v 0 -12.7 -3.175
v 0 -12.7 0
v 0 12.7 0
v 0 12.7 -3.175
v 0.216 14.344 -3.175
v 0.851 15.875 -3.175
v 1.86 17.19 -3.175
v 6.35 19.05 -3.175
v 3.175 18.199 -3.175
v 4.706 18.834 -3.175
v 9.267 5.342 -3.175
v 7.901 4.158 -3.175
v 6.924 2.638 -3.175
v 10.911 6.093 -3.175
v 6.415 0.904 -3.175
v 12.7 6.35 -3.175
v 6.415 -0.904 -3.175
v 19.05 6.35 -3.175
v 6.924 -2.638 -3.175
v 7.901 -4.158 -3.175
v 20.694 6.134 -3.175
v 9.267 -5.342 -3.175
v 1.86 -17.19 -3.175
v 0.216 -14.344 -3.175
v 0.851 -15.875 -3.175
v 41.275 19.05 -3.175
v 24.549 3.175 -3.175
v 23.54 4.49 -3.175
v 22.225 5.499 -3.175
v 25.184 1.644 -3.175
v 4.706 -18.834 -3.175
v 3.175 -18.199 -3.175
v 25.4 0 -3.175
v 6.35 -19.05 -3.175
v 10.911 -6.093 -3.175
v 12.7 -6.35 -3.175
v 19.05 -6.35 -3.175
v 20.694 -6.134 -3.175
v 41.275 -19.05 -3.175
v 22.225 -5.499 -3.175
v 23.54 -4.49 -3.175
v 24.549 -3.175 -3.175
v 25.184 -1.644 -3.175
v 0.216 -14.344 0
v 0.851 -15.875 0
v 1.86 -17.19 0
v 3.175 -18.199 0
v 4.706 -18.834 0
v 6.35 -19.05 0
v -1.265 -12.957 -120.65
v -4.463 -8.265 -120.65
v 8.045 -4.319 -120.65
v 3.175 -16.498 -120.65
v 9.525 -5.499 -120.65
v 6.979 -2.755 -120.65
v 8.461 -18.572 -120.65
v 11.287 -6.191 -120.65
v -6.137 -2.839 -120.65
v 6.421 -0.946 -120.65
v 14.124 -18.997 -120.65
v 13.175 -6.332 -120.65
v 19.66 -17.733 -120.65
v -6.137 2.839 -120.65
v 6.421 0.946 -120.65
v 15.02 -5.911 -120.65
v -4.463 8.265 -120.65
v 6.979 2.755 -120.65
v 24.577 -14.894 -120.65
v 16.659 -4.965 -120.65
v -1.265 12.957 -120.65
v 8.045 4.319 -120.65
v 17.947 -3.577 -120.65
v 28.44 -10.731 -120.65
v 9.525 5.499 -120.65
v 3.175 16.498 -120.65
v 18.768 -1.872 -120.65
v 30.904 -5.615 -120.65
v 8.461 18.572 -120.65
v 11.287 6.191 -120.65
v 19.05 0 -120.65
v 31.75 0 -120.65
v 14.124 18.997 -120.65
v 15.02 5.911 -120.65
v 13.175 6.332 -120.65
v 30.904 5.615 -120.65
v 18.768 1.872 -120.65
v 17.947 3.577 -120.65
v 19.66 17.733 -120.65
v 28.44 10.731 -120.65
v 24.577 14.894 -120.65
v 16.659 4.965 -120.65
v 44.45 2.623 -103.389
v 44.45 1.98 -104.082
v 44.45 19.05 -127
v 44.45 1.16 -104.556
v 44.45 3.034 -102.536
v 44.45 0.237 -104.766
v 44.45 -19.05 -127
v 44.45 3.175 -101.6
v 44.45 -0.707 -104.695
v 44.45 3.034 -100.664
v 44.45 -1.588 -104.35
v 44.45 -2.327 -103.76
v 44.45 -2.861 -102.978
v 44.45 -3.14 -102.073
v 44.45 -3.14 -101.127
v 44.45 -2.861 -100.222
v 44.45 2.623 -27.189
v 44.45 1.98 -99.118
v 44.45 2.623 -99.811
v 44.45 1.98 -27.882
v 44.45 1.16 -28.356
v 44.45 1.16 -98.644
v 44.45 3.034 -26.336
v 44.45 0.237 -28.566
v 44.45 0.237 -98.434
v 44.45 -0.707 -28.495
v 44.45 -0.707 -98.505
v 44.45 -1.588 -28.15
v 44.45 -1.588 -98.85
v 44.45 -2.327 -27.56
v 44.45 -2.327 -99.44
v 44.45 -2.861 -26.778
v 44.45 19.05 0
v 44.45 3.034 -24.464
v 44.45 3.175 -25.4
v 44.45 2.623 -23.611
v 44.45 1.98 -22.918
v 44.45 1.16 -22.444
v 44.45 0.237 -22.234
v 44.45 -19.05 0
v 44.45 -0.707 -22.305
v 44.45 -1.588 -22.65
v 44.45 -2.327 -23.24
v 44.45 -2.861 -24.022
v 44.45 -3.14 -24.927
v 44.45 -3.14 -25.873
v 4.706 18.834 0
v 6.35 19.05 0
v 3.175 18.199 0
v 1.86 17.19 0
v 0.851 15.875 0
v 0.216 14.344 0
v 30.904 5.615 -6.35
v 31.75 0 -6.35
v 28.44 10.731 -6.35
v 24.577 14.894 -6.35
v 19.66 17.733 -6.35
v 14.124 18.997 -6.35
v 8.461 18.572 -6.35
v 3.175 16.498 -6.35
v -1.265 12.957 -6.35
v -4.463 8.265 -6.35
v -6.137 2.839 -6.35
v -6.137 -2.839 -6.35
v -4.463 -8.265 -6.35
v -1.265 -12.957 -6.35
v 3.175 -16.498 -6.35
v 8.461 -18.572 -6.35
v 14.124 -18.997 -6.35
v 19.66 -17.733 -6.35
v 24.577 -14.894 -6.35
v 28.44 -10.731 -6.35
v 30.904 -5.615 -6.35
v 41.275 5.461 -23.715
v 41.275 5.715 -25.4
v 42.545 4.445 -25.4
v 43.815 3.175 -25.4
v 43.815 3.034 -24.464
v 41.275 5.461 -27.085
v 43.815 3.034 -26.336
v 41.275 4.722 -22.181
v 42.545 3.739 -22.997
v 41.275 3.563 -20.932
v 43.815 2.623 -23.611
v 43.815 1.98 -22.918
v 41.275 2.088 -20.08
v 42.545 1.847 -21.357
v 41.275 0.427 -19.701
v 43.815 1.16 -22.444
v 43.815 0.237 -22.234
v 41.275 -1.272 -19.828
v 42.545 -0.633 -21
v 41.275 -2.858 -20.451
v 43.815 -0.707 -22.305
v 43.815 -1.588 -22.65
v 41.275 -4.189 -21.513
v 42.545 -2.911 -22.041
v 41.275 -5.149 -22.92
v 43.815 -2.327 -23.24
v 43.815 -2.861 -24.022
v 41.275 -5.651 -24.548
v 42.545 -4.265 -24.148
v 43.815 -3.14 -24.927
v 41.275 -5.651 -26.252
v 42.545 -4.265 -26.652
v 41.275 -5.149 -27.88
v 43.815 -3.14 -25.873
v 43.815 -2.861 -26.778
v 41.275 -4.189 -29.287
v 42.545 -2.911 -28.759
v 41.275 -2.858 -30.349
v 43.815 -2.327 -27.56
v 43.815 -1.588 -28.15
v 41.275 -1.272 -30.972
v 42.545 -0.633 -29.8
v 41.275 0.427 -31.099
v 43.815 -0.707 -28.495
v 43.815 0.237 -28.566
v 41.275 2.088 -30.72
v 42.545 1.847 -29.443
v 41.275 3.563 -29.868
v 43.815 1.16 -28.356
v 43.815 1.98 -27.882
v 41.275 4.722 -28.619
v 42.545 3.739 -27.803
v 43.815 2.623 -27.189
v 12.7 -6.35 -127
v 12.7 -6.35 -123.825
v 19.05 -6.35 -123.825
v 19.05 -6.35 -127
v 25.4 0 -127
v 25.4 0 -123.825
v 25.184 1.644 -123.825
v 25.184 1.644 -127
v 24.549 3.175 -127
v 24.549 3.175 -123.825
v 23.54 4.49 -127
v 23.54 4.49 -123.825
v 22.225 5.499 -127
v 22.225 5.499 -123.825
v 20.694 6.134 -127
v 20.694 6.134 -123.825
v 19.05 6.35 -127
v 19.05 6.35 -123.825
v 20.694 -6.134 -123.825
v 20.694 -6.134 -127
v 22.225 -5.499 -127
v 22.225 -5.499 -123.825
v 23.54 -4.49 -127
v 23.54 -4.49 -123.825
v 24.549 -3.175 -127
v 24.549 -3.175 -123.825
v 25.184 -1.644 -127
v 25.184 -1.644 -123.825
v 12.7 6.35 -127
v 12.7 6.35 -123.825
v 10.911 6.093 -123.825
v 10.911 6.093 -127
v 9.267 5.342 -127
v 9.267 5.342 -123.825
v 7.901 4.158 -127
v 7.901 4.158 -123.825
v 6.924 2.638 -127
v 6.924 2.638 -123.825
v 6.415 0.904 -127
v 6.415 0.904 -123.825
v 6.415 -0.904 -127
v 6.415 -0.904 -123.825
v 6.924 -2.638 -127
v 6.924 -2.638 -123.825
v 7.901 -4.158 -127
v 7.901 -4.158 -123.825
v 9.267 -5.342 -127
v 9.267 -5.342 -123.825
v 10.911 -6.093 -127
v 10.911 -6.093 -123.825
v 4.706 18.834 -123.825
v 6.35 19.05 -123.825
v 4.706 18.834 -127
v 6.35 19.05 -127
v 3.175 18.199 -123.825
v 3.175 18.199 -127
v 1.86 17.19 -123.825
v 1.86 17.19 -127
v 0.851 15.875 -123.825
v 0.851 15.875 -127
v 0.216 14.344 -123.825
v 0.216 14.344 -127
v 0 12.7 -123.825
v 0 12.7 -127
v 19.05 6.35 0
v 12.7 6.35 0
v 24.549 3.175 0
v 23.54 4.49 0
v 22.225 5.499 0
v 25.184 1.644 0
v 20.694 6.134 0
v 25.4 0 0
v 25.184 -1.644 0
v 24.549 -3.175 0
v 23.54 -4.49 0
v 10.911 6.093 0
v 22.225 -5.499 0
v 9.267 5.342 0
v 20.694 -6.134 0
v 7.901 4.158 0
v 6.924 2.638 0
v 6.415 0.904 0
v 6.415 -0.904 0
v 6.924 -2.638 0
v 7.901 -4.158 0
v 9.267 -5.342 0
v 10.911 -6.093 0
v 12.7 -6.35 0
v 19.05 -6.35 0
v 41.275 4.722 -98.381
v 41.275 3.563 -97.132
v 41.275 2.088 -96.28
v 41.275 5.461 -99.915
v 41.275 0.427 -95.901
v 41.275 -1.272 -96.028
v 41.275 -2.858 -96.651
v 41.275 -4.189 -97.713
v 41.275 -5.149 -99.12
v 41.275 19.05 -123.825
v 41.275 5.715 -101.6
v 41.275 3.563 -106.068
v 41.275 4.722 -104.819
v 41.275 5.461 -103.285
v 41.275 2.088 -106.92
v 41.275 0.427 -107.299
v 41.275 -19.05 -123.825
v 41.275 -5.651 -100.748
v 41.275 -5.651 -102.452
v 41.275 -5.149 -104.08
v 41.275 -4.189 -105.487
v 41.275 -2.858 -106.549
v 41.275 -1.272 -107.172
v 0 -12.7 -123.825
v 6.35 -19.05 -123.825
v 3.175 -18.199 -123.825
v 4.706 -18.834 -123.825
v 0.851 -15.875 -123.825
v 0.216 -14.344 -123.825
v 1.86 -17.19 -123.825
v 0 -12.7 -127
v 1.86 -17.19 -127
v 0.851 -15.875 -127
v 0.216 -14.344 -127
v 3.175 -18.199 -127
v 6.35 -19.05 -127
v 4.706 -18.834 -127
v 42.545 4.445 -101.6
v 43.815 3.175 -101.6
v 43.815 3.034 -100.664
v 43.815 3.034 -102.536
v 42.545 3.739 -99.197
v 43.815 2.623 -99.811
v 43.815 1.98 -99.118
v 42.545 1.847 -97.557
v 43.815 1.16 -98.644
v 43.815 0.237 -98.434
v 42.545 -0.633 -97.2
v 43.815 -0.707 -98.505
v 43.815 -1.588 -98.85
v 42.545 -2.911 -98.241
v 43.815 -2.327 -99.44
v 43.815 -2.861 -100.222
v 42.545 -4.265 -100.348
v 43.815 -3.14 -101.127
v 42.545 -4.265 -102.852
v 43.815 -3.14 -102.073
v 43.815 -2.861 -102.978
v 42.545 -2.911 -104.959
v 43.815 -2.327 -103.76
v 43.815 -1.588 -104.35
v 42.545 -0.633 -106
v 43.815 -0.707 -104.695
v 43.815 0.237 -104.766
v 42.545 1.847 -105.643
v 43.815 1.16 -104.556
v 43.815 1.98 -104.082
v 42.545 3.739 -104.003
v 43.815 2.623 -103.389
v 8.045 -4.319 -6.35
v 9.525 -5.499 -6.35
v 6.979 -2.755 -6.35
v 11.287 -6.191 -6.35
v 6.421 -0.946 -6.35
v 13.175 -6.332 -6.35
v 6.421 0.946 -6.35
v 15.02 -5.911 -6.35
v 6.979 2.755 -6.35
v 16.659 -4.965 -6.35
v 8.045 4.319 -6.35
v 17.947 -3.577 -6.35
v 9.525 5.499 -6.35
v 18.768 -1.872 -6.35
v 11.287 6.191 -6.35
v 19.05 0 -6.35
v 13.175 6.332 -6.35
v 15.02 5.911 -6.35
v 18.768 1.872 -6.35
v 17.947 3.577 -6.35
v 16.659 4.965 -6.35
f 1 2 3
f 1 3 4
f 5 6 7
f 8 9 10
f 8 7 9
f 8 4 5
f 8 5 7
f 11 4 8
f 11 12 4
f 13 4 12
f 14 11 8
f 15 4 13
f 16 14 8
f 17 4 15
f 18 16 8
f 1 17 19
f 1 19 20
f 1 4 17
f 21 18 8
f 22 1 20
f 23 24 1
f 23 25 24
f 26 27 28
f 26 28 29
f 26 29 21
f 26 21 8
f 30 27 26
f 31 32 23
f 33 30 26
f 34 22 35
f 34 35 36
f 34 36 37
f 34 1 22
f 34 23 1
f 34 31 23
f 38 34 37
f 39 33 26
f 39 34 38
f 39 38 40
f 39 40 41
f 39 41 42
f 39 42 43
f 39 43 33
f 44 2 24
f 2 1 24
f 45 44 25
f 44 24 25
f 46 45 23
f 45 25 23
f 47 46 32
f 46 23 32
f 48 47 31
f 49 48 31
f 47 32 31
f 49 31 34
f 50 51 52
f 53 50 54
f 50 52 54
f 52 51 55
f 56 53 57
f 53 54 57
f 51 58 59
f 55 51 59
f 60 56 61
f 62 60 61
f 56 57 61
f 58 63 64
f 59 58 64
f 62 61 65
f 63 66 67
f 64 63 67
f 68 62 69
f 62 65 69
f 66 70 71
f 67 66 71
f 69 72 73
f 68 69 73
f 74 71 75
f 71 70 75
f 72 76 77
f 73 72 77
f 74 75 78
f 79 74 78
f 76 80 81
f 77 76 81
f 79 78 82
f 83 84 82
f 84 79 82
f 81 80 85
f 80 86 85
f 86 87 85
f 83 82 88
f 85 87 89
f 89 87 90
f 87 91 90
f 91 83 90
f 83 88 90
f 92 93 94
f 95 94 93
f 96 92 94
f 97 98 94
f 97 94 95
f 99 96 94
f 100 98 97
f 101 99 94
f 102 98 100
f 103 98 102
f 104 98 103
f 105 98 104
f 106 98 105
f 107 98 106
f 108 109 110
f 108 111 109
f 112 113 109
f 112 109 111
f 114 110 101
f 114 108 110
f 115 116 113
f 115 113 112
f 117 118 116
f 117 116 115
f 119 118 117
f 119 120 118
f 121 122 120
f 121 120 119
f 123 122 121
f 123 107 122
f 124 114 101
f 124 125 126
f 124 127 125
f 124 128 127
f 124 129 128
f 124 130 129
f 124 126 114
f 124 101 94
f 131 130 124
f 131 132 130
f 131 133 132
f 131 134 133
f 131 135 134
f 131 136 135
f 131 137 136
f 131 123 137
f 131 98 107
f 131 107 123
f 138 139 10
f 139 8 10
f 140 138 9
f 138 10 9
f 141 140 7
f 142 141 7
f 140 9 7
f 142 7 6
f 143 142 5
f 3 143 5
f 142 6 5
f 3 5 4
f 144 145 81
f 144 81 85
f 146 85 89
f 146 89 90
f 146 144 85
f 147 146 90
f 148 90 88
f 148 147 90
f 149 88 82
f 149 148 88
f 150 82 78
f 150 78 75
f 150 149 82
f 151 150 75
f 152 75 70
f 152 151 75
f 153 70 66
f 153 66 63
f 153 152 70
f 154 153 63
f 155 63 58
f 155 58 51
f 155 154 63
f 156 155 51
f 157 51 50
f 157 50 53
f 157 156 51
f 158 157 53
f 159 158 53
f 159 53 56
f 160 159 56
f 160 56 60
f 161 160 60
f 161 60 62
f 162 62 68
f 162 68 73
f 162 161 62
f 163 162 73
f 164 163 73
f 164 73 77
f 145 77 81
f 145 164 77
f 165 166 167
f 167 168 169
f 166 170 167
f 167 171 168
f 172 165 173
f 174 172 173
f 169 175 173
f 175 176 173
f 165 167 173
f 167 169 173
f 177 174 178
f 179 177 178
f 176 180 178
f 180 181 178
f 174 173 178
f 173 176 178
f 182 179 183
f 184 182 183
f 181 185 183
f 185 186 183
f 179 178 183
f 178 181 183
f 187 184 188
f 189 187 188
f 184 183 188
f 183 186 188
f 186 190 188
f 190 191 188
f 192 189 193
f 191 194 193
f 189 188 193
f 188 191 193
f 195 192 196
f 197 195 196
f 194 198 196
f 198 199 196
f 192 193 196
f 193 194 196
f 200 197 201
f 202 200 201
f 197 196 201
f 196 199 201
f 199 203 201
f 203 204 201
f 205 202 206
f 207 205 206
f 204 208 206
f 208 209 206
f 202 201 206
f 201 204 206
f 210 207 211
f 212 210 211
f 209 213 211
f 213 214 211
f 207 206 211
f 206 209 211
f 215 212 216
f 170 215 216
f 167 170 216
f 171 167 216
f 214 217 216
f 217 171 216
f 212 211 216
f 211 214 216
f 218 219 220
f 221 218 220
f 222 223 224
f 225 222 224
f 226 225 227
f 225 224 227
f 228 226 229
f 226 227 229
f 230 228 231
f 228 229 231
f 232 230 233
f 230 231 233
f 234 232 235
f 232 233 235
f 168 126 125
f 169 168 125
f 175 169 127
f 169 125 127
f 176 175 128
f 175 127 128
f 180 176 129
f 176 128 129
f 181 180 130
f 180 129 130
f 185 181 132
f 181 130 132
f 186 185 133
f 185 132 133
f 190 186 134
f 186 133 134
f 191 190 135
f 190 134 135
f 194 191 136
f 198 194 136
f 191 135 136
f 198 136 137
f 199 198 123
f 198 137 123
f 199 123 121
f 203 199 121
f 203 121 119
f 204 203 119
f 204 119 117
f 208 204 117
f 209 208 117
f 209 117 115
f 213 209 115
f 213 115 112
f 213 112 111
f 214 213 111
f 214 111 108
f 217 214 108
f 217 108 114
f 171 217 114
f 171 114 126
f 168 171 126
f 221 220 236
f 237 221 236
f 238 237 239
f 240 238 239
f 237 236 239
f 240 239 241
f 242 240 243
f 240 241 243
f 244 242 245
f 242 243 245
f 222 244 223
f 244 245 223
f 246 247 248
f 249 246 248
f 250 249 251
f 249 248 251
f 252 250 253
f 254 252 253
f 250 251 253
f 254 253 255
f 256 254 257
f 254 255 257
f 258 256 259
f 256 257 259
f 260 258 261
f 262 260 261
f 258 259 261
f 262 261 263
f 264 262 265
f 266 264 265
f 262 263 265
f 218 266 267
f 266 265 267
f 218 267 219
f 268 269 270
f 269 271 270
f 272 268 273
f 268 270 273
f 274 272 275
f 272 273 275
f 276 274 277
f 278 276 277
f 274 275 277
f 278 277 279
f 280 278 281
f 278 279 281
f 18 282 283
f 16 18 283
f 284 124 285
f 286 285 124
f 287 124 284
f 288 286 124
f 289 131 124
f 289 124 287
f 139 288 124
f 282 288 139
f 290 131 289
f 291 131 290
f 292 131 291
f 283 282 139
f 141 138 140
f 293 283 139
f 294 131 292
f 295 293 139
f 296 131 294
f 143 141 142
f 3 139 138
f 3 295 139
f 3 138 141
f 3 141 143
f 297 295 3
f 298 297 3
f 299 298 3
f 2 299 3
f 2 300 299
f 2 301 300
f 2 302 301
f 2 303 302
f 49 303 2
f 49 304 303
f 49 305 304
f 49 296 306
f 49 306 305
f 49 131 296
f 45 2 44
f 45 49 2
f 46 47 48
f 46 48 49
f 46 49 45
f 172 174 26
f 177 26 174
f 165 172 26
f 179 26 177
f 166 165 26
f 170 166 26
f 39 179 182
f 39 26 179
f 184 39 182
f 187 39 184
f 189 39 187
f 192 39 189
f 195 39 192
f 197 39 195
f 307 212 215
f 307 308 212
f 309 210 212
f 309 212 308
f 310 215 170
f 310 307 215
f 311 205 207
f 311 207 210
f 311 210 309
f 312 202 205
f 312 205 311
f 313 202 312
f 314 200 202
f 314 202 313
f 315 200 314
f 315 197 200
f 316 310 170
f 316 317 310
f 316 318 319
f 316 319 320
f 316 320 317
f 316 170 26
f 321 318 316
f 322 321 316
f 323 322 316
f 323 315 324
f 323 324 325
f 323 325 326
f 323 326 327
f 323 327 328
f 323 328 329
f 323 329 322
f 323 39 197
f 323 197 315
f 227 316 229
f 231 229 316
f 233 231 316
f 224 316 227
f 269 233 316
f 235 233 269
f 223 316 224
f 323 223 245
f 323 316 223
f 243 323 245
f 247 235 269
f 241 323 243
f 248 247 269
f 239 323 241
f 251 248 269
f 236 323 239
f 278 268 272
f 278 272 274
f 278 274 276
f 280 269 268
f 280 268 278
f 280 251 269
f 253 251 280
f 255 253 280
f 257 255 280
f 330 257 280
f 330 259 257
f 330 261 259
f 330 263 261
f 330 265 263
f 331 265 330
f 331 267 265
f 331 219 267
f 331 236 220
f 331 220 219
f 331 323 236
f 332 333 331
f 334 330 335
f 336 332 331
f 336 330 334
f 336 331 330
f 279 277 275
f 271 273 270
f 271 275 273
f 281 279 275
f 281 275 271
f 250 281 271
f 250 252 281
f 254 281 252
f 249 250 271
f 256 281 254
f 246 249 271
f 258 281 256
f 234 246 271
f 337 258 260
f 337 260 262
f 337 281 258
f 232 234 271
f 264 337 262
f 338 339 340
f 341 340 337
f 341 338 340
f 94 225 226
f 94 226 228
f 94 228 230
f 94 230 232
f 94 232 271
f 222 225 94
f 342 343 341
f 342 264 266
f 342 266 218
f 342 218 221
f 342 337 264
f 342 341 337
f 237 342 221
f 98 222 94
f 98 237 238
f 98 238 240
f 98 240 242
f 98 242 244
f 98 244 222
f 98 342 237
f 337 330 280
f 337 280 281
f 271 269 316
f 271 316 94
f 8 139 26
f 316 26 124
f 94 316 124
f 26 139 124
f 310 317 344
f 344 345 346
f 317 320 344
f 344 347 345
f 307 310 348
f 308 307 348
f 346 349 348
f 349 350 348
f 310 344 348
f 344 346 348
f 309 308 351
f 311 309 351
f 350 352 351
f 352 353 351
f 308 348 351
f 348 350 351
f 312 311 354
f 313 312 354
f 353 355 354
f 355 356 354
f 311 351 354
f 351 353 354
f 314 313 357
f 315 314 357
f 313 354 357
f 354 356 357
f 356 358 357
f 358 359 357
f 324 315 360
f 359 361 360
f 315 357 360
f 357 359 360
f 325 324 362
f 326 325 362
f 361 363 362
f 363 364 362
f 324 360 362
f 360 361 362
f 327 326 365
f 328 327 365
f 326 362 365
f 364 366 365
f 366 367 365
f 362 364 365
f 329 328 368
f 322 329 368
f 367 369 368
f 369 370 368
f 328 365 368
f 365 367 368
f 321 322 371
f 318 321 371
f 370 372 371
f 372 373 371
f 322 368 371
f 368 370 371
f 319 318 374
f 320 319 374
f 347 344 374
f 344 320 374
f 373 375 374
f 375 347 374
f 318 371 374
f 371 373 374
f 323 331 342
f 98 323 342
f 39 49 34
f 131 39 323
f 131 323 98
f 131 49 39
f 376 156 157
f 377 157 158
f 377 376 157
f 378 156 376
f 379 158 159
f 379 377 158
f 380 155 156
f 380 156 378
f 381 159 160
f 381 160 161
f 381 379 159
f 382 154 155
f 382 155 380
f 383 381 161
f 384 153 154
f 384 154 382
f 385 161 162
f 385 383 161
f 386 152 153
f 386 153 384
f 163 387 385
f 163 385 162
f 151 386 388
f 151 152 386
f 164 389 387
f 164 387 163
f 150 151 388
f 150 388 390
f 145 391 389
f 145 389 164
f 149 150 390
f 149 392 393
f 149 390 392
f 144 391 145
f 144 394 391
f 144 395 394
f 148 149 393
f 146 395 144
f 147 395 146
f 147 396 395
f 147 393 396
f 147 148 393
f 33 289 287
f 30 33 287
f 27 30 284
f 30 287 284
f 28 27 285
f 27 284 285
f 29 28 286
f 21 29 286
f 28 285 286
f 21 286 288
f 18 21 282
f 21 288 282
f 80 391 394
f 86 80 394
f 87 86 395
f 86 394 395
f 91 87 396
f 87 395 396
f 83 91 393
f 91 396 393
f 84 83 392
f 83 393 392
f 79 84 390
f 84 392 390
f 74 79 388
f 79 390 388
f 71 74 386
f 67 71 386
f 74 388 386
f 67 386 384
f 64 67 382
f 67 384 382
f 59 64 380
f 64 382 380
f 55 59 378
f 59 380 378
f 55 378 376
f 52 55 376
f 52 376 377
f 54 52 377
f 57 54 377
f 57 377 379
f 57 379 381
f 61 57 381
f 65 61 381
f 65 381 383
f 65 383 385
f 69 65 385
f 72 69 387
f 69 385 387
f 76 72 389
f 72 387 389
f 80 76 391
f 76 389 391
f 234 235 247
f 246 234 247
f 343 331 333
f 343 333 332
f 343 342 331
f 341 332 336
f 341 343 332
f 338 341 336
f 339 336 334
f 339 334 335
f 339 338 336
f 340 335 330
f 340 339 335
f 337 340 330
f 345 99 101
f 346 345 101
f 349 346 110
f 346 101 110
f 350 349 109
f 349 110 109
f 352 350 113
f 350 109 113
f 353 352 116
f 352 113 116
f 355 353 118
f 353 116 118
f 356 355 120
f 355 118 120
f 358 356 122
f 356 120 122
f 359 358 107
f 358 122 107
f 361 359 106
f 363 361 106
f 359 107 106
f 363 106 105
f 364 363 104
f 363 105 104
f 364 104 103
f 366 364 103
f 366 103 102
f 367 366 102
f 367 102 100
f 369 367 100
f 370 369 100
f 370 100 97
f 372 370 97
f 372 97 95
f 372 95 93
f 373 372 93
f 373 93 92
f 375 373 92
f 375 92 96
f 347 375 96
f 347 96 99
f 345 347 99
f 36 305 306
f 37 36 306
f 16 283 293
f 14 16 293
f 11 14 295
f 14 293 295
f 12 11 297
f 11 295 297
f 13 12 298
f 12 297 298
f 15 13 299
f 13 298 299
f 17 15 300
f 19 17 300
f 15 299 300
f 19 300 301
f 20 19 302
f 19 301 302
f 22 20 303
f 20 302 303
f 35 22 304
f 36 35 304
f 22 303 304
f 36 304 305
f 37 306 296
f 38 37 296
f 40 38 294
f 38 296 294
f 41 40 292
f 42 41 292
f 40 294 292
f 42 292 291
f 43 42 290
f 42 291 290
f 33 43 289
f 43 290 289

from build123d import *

# Parameters (mm, degrees)
F1_START = -6.35
F0_R     = 19.05
F0_R_2   = 6.35
F1_DEPTH = 114.3
F3_DEPTH = 19.05
F5_DEPTH = 127.001
F6_R     = 6.35
F7_R     = 3.175
F8_DEPTH = 50.801
F9_SIZE  = 2.54


with BuildPart() as f1:
    # F0 (on Top) → F1 (new body)
    with BuildSketch(Plane.XY.offset(F1_START)):
        with Locations((12.7, 0)):
            Circle(F0_R)
        with Locations((12.7, 0)):
            Circle(F0_R_2, mode=Mode.SUBTRACT)
    extrude(amount=-F1_DEPTH)


with BuildPart() as f3:
    # F2 (on Front) → F3 (new body, symmetric)
    with BuildSketch(Plane.XZ):
        Polygon((44.45, 0), (0, 0), (0, -3.175), (41.275, -3.175), (41.275, -123.825), (0, -123.825), (0, -127), (44.45, -127), align=None)
    extrude(amount=F3_DEPTH, both=True)

    # F4 (on face) → F5 (cut, through all)
    with BuildSketch(Plane.XY):
        with BuildLine():
            ThreePointArc((19.05, 6.35), (17.4064990636, 6.1336289969), (15.875, 5.499261314))
            ThreePointArc((15.875, 5.499261314), (18.199261314, 3.175), (19.05, 0))
            ThreePointArc((19.05, 0), (18.199261314, -3.175), (15.875, -5.499261314))
            ThreePointArc((15.875, -5.499261314), (17.4064990636, -6.1336289969), (19.05, -6.35))
            ThreePointArc((19.05, -6.35), (23.5401280605, -4.4901280605), (25.4, 0))
            ThreePointArc((25.4, 0), (23.5401280605, 4.4901280605), (19.05, 6.35))
        make_face()
        with BuildLine():
            ThreePointArc((15.875, 5.499261314), (14.3435009364, 6.1336289969), (12.7, 6.35))
            ThreePointArc((12.7, 6.35), (6.35, 0), (12.7, -6.35))
            ThreePointArc((12.7, -6.35), (14.3435009364, -6.1336289969), (15.875, -5.499261314))
            ThreePointArc((15.875, -5.499261314), (12.7, 0), (15.875, 5.499261314))
        make_face()
        with BuildLine():
            ThreePointArc((19.05, 0), (18.199261314, 3.175), (15.875, 5.499261314))
            ThreePointArc((15.875, 5.499261314), (12.7, 0), (15.875, -5.499261314))
            ThreePointArc((15.875, -5.499261314), (18.199261314, -3.175), (19.05, 0))
        make_face()
        with BuildLine():
            Line((19.05, 6.35), (12.7, 6.35))
            ThreePointArc((12.7, 6.35), (14.3435009364, 6.1336289969), (15.875, 5.499261314))
            ThreePointArc((15.875, 5.499261314), (17.4064990636, 6.1336289969), (19.05, 6.35))
        make_face()
        with BuildLine():
            ThreePointArc((15.875, -5.499261314), (14.3435009364, -6.1336289969), (12.7, -6.35))
            Line((12.7, -6.35), (19.05, -6.35))
            ThreePointArc((19.05, -6.35), (17.4064990636, -6.1336289969), (15.875, -5.499261314))
        make_face()
    extrude(amount=-F5_DEPTH, mode=Mode.SUBTRACT)

    # F6
    f6_edges = [f3.edges().sort_by_distance(p)[0] for p in [
        (0, 19.05, -1.5875),
        (0, -19.05, -1.5875),
        (0, -19.05, -125.4125),
        (0, 19.05, -125.4125),
    ]]
    fillet(f6_edges, radius=F6_R)

    # F7 (on face) → F8 (cut, through all)
    with BuildSketch(Plane.YZ.offset(44.45)):
        with Locations((0, -25.4)):
            Circle(F7_R)
        with Locations((0, -101.6)):
            Circle(F7_R)
    extrude(amount=-F8_DEPTH, mode=Mode.SUBTRACT)

    # F9
    f9_edges = [f3.edges().sort_by_distance(p)[0] for p in [
        (41.275, -3.175, -25.4),
        (41.275, -3.175, -101.6),
    ]]
    chamfer(f9_edges, length=F9_SIZE)


solid = Compound([f1.part, f3.part])
